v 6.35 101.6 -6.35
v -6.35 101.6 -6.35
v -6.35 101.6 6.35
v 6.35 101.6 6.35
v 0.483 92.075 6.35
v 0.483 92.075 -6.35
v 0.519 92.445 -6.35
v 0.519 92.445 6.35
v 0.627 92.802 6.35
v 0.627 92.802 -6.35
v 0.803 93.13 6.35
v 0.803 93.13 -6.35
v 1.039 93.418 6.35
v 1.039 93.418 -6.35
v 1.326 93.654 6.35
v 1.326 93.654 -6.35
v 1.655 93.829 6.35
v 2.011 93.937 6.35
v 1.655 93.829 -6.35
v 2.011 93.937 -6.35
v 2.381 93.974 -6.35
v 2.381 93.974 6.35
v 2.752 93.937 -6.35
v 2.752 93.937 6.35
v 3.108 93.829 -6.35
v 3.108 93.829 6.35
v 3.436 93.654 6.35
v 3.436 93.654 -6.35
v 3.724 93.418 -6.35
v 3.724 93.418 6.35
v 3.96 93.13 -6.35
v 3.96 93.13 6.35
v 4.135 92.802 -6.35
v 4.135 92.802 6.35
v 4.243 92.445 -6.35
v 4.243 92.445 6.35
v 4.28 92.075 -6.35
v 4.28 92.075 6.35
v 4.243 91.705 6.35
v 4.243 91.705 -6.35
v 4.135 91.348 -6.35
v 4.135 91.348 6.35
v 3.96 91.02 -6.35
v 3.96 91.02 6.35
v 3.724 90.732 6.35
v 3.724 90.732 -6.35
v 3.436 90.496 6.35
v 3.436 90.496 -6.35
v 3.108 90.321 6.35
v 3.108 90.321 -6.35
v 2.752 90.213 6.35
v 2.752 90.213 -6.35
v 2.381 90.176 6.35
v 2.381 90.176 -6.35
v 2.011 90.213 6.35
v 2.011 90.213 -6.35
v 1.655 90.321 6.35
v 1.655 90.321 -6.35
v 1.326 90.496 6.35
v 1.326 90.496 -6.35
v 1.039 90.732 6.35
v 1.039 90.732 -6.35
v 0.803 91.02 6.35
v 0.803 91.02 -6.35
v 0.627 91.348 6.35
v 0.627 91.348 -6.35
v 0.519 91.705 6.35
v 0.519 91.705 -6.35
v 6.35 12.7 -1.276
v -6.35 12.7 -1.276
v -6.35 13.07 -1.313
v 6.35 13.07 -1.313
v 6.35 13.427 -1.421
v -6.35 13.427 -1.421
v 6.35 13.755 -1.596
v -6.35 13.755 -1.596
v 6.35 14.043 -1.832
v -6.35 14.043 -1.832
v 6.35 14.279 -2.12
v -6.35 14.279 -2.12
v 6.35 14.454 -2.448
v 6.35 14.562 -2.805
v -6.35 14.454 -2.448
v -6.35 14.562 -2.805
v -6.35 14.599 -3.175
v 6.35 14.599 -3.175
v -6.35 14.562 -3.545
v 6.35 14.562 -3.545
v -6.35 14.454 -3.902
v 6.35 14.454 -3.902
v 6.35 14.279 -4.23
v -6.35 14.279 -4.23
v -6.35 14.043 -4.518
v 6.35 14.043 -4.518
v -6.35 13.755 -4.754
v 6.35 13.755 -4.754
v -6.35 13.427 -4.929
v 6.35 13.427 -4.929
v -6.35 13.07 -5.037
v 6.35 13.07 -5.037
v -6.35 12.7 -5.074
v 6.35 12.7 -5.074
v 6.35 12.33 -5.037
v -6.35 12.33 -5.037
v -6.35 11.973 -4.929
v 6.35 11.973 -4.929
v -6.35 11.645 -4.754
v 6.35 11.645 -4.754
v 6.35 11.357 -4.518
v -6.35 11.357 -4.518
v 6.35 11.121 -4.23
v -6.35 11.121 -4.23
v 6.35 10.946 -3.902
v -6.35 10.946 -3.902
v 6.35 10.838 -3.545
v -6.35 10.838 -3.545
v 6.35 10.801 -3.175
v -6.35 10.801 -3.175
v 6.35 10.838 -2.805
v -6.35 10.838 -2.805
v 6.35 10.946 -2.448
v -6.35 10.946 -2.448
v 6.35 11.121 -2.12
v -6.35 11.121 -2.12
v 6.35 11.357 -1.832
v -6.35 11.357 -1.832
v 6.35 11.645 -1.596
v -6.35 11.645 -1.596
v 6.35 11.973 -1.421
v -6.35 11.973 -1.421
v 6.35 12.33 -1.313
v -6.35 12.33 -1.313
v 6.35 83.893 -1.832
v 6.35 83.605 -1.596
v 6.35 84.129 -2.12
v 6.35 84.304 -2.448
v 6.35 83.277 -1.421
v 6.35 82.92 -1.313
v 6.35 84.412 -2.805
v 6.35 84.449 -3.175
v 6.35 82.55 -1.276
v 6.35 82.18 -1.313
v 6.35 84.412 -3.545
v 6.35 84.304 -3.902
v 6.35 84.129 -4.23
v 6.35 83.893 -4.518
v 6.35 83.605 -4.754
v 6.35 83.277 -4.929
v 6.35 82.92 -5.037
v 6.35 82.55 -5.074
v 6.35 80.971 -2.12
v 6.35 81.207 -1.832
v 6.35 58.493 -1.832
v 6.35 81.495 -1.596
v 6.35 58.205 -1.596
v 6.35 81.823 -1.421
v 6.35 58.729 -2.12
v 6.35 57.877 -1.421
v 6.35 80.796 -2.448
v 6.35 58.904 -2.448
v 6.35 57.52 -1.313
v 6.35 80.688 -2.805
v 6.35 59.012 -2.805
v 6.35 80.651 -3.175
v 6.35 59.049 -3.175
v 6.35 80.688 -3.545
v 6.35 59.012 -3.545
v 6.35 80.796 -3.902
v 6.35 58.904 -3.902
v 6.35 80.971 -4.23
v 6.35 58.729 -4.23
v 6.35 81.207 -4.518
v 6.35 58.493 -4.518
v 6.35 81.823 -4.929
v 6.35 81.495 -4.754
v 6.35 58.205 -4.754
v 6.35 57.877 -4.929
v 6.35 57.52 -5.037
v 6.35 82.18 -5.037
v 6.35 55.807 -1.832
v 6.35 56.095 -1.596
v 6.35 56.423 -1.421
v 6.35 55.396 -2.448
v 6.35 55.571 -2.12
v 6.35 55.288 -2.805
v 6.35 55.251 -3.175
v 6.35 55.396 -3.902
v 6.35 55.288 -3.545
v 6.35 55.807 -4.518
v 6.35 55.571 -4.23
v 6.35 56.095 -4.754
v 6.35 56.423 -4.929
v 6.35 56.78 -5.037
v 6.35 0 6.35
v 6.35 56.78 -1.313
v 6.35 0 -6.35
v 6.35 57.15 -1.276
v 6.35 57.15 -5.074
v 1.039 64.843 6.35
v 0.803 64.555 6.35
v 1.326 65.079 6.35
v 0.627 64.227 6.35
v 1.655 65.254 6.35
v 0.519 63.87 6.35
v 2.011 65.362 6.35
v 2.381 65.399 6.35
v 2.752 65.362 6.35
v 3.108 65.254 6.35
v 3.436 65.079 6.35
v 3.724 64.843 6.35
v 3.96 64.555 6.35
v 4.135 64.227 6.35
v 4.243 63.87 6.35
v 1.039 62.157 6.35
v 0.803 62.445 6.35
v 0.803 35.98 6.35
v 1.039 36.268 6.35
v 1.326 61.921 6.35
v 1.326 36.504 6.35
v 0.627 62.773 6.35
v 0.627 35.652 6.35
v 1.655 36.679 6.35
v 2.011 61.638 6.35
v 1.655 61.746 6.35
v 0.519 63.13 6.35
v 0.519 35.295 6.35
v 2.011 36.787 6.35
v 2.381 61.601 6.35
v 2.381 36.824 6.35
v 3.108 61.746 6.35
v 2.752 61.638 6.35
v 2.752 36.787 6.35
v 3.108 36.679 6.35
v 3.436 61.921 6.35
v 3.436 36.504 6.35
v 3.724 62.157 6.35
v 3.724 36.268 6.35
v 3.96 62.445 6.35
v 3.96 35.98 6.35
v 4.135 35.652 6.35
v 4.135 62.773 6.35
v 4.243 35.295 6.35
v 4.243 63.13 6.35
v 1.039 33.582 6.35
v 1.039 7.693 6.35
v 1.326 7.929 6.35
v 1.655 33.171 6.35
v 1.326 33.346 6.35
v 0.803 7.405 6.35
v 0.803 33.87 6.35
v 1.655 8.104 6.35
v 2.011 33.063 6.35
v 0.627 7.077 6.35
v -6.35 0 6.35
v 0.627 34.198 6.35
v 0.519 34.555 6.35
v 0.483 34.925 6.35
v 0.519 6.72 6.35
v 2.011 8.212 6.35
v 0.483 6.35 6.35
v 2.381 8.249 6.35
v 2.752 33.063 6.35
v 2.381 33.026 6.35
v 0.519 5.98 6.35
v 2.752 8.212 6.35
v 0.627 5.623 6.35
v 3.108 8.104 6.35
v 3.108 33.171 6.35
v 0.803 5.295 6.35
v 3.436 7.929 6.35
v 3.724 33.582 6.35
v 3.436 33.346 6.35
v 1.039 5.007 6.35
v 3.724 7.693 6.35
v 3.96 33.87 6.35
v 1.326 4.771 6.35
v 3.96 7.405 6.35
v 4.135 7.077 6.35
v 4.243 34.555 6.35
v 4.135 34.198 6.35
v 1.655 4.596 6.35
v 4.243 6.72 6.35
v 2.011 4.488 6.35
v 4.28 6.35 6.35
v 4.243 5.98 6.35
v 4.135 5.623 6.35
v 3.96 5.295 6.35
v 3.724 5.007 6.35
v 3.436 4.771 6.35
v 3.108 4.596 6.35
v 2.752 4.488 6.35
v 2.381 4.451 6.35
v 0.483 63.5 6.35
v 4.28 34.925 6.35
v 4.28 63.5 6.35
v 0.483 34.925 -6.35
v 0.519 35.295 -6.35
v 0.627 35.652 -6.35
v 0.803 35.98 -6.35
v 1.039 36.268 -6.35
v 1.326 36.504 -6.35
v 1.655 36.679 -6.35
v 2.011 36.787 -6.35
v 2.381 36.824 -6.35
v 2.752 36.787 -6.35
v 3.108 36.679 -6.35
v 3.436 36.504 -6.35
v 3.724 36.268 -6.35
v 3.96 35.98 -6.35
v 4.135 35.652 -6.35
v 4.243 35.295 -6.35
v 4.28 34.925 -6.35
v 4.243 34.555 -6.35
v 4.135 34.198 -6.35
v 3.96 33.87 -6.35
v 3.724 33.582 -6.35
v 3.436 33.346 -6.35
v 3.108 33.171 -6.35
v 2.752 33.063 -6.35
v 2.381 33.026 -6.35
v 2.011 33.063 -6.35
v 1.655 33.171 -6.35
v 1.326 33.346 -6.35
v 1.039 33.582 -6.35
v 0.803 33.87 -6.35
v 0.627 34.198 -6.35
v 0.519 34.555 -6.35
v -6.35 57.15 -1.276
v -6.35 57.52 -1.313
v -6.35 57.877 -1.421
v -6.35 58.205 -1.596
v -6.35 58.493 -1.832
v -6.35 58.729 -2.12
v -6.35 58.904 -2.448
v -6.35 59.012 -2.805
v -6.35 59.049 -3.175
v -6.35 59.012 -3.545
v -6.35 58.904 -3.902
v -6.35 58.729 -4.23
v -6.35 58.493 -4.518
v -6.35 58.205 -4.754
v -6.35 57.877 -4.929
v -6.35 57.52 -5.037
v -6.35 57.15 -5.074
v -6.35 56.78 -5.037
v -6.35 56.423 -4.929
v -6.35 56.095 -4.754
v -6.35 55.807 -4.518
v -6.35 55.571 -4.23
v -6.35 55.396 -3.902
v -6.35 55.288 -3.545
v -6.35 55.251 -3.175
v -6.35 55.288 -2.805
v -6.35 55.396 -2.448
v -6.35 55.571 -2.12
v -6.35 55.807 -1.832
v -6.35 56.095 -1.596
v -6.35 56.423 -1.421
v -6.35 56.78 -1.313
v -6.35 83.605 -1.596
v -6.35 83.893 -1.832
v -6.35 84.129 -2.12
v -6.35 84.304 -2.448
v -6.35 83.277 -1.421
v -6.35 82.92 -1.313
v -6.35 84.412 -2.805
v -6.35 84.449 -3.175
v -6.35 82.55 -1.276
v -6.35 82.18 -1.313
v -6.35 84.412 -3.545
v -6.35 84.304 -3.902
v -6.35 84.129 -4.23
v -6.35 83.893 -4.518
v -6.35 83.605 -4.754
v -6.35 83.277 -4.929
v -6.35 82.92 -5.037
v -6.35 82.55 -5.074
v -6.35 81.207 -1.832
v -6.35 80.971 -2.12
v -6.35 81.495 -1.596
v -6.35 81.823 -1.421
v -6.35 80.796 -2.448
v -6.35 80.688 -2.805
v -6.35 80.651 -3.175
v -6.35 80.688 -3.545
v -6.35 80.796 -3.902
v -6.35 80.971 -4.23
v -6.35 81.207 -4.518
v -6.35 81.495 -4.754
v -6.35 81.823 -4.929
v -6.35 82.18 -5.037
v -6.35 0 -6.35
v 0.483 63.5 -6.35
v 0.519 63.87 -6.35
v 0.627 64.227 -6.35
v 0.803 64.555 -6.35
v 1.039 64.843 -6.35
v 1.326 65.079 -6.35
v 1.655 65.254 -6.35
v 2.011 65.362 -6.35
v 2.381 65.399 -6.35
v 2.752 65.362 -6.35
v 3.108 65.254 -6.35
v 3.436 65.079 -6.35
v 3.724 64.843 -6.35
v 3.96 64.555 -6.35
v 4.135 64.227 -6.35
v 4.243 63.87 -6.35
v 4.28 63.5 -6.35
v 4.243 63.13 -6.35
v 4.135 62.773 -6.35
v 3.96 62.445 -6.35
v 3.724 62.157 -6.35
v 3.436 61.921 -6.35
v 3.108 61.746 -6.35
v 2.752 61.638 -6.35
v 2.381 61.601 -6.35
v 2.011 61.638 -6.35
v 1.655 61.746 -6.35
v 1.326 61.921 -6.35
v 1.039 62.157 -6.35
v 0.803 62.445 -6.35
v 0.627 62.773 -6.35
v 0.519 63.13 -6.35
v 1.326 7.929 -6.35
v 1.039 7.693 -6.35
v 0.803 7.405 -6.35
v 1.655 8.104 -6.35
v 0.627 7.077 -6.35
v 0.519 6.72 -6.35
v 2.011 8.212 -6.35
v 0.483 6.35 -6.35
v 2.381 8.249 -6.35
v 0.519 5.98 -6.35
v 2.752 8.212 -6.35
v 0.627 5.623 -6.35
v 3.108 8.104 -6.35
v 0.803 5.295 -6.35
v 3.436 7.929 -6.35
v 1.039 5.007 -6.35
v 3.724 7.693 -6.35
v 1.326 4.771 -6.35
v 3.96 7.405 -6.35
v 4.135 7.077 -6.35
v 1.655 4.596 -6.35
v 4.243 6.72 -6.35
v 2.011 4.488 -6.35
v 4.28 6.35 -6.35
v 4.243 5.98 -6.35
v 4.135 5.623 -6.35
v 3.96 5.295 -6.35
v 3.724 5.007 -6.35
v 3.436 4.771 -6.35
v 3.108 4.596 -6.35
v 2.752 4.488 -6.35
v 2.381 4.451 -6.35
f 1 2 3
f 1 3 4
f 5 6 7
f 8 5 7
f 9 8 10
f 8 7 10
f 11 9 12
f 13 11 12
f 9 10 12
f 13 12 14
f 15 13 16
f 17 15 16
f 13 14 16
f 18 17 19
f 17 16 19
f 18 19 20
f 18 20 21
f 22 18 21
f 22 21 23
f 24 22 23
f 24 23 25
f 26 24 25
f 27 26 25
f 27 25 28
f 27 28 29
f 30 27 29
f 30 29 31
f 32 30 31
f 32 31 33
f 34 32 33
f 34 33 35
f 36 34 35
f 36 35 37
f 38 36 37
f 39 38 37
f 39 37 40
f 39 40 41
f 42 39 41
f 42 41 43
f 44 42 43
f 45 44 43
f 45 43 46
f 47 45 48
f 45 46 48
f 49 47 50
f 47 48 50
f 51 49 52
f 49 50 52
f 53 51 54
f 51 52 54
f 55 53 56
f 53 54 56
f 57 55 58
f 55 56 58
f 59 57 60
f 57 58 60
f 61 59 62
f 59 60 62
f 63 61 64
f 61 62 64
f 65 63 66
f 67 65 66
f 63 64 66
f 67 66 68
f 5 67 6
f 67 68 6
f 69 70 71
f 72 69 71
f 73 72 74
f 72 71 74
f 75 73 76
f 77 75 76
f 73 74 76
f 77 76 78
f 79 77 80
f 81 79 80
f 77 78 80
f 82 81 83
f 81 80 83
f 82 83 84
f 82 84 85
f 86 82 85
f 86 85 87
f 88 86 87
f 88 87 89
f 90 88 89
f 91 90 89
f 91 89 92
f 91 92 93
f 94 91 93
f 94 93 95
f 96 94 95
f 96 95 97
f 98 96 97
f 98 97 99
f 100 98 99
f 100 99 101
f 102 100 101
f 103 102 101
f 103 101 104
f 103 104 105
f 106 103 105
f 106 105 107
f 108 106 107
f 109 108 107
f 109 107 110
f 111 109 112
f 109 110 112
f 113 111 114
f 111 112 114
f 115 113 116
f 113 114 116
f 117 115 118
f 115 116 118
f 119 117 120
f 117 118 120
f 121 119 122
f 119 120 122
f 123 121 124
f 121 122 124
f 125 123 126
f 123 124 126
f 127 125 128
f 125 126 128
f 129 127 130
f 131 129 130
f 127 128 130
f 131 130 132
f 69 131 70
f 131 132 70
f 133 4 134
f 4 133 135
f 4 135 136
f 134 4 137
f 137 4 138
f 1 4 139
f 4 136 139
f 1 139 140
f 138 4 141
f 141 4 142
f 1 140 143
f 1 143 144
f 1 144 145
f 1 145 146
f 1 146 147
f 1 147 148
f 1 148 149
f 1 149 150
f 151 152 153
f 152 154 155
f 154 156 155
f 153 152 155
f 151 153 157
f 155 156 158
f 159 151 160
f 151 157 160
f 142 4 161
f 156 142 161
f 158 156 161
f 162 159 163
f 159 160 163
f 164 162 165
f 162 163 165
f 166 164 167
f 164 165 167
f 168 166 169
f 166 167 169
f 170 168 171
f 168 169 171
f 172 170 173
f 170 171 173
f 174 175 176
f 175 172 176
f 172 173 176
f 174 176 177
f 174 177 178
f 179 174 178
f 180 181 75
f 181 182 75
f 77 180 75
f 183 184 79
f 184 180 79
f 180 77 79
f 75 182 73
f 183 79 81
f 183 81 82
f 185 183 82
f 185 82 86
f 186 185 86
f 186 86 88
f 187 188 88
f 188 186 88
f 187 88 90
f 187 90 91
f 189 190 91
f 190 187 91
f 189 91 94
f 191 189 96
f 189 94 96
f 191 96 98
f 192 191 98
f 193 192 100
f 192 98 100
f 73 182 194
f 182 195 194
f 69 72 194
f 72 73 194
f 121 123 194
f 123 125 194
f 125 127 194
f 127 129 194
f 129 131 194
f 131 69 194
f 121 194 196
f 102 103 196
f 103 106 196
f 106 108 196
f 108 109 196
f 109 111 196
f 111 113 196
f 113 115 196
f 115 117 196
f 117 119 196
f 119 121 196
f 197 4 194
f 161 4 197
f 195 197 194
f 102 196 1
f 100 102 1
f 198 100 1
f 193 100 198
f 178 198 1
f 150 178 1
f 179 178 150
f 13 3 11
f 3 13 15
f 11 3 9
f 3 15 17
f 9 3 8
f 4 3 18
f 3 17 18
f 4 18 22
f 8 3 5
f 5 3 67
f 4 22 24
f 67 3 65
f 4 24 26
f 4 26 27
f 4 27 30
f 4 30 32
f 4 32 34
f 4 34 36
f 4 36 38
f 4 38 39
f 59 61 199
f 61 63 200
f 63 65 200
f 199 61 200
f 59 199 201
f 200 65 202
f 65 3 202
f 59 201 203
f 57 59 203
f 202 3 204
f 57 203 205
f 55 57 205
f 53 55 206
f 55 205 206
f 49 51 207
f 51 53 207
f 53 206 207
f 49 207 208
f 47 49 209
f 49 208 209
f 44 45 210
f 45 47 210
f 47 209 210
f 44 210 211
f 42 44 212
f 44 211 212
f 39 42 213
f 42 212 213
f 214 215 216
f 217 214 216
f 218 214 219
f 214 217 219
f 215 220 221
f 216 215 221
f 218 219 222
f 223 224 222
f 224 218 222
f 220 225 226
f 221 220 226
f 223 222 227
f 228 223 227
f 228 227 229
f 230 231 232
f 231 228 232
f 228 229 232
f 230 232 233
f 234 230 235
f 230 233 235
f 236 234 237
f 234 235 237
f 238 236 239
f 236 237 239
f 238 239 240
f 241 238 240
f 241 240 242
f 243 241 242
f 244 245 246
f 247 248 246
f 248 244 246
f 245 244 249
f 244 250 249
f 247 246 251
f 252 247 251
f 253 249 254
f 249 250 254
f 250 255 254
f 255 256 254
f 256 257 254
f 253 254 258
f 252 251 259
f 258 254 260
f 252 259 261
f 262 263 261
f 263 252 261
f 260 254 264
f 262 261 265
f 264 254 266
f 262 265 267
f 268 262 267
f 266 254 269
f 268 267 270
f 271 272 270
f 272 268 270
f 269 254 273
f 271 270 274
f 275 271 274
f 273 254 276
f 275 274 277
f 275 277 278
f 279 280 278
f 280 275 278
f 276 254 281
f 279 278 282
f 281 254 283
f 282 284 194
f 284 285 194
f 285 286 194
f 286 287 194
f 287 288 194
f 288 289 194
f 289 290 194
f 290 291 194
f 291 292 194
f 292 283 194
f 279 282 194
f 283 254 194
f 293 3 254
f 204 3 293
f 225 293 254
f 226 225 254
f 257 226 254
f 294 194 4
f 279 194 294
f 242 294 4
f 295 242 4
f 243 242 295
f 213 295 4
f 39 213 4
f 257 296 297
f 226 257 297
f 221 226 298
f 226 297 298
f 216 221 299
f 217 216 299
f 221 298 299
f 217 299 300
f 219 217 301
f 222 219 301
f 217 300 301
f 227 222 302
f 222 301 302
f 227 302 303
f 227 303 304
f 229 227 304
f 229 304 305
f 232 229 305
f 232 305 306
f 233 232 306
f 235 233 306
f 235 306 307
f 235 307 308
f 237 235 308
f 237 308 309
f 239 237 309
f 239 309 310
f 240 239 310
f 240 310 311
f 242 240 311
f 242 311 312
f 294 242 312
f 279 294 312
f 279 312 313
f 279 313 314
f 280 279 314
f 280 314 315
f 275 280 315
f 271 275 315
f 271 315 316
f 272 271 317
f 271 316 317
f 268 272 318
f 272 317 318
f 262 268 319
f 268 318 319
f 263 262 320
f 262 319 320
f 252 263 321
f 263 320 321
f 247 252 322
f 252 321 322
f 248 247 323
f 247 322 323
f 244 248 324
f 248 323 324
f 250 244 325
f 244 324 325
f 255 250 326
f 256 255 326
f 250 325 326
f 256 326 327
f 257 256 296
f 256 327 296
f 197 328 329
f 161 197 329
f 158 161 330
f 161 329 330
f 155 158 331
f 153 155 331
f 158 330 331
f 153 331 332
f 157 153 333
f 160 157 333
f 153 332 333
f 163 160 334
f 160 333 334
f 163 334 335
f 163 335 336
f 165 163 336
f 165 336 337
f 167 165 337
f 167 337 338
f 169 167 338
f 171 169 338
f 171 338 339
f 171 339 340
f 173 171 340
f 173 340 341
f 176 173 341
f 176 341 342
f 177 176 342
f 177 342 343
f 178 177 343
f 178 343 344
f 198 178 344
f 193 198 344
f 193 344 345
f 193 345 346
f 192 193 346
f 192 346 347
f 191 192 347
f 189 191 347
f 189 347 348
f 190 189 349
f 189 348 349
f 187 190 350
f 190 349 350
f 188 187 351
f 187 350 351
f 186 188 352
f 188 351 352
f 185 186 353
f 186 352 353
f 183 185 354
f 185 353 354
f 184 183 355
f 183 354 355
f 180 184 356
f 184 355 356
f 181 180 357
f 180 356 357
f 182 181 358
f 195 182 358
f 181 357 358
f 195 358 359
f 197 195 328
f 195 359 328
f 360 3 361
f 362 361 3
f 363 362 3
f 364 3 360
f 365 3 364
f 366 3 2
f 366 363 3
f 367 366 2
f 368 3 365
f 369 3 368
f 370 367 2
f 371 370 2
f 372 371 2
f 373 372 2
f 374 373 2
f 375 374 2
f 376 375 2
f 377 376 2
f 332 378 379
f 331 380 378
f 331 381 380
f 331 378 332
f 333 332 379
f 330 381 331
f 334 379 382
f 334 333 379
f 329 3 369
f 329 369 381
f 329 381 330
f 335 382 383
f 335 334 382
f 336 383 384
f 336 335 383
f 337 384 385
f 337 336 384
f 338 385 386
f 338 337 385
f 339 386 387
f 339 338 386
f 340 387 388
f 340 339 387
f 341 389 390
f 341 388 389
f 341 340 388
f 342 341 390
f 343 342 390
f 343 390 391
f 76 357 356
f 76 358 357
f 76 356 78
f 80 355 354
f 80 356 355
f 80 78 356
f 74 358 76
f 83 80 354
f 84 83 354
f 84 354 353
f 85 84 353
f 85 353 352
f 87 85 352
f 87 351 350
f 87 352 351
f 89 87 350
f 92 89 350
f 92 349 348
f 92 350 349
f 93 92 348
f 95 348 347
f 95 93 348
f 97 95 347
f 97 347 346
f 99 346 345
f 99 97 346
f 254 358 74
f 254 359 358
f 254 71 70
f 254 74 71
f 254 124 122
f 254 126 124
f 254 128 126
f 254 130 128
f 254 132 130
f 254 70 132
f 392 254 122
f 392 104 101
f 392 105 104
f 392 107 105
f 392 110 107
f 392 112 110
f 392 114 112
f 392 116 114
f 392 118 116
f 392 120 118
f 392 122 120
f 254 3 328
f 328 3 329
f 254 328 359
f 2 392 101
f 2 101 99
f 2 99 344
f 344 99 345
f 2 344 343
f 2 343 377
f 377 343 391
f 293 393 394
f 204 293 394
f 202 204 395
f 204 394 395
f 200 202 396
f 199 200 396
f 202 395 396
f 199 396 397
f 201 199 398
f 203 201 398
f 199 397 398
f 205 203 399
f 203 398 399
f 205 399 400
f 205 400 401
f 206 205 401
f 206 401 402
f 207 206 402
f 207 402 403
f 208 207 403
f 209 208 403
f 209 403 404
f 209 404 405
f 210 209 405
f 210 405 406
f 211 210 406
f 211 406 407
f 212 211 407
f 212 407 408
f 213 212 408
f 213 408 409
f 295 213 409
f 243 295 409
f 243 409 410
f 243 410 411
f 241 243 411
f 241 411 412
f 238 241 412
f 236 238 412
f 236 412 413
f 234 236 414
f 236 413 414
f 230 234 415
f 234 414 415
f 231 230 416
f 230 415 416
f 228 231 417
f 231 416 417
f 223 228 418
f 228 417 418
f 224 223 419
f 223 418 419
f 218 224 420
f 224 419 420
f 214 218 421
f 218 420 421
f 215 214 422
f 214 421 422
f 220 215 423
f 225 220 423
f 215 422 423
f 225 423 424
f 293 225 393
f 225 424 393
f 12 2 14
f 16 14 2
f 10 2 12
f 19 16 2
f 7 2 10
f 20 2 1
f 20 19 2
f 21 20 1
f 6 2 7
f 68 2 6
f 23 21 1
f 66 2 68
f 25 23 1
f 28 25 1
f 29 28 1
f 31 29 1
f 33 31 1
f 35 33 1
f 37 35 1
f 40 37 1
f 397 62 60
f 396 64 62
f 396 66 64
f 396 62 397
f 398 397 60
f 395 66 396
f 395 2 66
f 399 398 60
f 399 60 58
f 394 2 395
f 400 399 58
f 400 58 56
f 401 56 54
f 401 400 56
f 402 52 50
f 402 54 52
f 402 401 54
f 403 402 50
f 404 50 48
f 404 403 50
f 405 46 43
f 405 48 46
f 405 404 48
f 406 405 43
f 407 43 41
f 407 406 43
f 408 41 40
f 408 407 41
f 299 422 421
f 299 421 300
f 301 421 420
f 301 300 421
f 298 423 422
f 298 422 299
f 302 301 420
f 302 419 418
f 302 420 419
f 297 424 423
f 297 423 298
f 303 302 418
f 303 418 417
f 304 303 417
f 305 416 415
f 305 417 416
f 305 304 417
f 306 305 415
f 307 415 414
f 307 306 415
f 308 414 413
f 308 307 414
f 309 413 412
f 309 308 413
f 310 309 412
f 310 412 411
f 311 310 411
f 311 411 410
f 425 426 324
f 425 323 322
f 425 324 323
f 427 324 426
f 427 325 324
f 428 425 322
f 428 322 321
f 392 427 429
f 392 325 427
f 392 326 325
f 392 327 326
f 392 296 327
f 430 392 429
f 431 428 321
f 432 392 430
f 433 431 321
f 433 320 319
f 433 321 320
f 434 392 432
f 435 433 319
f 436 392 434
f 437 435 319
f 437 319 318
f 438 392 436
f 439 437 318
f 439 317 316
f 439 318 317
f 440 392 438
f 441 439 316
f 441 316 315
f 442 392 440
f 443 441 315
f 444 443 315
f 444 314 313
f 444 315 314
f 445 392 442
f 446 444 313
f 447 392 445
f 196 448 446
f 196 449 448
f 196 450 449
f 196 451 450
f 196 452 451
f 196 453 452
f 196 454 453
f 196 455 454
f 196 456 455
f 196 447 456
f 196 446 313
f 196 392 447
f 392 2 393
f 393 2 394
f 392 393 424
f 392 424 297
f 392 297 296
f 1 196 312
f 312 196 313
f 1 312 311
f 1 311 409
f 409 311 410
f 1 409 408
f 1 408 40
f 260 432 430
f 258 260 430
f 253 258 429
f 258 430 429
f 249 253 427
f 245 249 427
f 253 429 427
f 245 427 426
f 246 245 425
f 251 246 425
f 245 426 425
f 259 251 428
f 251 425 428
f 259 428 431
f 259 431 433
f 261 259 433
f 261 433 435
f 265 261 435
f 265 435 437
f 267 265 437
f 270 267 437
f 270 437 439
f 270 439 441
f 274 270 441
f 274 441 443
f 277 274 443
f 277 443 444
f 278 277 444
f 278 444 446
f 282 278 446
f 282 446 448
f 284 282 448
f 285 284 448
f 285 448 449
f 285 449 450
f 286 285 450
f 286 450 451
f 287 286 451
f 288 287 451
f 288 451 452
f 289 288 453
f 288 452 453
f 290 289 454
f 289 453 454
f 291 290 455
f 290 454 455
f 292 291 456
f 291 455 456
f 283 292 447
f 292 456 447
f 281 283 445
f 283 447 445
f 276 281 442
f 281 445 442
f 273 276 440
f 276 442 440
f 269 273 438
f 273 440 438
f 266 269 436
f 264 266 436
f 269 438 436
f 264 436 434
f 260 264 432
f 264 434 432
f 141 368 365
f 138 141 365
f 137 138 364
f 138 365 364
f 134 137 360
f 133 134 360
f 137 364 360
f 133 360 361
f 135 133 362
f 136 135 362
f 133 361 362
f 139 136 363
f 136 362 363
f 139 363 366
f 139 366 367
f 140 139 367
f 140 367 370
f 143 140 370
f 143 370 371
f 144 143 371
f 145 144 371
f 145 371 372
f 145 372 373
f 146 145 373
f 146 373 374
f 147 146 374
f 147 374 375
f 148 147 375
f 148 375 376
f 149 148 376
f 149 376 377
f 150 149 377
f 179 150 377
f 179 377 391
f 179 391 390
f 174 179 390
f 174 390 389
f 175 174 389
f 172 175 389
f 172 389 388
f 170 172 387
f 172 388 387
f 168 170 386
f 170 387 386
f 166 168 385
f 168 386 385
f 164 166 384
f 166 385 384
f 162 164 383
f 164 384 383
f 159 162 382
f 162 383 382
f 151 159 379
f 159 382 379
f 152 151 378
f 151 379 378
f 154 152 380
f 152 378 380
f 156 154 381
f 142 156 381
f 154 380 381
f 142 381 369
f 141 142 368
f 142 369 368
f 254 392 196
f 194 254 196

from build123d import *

# Parameters (mm, degrees)
SKETCH1_W                  = 12.7
SKETCH1_H                  = 12.7
BOSS_EXTRUDE1_DEPTH        = 101.6
TAP_DRILL_FOR_10_24_TAP1_D = 3.7973
TAP_DRILL_FOR_10_24_TAP2_D = 3.7973


with BuildPart() as part:
    # Sketch1 → Boss-Extrude1 (new body)
    with BuildSketch(Plane(origin=(0, 0, 0), x_dir=(1, 0, 0), z_dir=(0, 1, 0))):
        Rectangle(SKETCH1_W, SKETCH1_H)
    extrude(amount=BOSS_EXTRUDE1_DEPTH)

    # Tap Drill for #10-24 Tap1 (through all)
    with Locations(Plane(origin=(6.35, 0, 0), x_dir=(0, 0, -1), z_dir=(1, 0, 0))):
        with Locations((3.175, 82.55), (3.175, 12.7), (3.175, 57.15)):
            Hole(TAP_DRILL_FOR_10_24_TAP1_D / 2)

    # Tap Drill for #10-24 Tap2 (through all)
    with Locations(Plane.XY.offset(6.35)):
        with Locations((2.38125, 92.075), (2.38125, 6.35), (2.38125, 34.925), (2.38125, 63.5)):
            Hole(TAP_DRILL_FOR_10_24_TAP2_D / 2)


solid = part.part
